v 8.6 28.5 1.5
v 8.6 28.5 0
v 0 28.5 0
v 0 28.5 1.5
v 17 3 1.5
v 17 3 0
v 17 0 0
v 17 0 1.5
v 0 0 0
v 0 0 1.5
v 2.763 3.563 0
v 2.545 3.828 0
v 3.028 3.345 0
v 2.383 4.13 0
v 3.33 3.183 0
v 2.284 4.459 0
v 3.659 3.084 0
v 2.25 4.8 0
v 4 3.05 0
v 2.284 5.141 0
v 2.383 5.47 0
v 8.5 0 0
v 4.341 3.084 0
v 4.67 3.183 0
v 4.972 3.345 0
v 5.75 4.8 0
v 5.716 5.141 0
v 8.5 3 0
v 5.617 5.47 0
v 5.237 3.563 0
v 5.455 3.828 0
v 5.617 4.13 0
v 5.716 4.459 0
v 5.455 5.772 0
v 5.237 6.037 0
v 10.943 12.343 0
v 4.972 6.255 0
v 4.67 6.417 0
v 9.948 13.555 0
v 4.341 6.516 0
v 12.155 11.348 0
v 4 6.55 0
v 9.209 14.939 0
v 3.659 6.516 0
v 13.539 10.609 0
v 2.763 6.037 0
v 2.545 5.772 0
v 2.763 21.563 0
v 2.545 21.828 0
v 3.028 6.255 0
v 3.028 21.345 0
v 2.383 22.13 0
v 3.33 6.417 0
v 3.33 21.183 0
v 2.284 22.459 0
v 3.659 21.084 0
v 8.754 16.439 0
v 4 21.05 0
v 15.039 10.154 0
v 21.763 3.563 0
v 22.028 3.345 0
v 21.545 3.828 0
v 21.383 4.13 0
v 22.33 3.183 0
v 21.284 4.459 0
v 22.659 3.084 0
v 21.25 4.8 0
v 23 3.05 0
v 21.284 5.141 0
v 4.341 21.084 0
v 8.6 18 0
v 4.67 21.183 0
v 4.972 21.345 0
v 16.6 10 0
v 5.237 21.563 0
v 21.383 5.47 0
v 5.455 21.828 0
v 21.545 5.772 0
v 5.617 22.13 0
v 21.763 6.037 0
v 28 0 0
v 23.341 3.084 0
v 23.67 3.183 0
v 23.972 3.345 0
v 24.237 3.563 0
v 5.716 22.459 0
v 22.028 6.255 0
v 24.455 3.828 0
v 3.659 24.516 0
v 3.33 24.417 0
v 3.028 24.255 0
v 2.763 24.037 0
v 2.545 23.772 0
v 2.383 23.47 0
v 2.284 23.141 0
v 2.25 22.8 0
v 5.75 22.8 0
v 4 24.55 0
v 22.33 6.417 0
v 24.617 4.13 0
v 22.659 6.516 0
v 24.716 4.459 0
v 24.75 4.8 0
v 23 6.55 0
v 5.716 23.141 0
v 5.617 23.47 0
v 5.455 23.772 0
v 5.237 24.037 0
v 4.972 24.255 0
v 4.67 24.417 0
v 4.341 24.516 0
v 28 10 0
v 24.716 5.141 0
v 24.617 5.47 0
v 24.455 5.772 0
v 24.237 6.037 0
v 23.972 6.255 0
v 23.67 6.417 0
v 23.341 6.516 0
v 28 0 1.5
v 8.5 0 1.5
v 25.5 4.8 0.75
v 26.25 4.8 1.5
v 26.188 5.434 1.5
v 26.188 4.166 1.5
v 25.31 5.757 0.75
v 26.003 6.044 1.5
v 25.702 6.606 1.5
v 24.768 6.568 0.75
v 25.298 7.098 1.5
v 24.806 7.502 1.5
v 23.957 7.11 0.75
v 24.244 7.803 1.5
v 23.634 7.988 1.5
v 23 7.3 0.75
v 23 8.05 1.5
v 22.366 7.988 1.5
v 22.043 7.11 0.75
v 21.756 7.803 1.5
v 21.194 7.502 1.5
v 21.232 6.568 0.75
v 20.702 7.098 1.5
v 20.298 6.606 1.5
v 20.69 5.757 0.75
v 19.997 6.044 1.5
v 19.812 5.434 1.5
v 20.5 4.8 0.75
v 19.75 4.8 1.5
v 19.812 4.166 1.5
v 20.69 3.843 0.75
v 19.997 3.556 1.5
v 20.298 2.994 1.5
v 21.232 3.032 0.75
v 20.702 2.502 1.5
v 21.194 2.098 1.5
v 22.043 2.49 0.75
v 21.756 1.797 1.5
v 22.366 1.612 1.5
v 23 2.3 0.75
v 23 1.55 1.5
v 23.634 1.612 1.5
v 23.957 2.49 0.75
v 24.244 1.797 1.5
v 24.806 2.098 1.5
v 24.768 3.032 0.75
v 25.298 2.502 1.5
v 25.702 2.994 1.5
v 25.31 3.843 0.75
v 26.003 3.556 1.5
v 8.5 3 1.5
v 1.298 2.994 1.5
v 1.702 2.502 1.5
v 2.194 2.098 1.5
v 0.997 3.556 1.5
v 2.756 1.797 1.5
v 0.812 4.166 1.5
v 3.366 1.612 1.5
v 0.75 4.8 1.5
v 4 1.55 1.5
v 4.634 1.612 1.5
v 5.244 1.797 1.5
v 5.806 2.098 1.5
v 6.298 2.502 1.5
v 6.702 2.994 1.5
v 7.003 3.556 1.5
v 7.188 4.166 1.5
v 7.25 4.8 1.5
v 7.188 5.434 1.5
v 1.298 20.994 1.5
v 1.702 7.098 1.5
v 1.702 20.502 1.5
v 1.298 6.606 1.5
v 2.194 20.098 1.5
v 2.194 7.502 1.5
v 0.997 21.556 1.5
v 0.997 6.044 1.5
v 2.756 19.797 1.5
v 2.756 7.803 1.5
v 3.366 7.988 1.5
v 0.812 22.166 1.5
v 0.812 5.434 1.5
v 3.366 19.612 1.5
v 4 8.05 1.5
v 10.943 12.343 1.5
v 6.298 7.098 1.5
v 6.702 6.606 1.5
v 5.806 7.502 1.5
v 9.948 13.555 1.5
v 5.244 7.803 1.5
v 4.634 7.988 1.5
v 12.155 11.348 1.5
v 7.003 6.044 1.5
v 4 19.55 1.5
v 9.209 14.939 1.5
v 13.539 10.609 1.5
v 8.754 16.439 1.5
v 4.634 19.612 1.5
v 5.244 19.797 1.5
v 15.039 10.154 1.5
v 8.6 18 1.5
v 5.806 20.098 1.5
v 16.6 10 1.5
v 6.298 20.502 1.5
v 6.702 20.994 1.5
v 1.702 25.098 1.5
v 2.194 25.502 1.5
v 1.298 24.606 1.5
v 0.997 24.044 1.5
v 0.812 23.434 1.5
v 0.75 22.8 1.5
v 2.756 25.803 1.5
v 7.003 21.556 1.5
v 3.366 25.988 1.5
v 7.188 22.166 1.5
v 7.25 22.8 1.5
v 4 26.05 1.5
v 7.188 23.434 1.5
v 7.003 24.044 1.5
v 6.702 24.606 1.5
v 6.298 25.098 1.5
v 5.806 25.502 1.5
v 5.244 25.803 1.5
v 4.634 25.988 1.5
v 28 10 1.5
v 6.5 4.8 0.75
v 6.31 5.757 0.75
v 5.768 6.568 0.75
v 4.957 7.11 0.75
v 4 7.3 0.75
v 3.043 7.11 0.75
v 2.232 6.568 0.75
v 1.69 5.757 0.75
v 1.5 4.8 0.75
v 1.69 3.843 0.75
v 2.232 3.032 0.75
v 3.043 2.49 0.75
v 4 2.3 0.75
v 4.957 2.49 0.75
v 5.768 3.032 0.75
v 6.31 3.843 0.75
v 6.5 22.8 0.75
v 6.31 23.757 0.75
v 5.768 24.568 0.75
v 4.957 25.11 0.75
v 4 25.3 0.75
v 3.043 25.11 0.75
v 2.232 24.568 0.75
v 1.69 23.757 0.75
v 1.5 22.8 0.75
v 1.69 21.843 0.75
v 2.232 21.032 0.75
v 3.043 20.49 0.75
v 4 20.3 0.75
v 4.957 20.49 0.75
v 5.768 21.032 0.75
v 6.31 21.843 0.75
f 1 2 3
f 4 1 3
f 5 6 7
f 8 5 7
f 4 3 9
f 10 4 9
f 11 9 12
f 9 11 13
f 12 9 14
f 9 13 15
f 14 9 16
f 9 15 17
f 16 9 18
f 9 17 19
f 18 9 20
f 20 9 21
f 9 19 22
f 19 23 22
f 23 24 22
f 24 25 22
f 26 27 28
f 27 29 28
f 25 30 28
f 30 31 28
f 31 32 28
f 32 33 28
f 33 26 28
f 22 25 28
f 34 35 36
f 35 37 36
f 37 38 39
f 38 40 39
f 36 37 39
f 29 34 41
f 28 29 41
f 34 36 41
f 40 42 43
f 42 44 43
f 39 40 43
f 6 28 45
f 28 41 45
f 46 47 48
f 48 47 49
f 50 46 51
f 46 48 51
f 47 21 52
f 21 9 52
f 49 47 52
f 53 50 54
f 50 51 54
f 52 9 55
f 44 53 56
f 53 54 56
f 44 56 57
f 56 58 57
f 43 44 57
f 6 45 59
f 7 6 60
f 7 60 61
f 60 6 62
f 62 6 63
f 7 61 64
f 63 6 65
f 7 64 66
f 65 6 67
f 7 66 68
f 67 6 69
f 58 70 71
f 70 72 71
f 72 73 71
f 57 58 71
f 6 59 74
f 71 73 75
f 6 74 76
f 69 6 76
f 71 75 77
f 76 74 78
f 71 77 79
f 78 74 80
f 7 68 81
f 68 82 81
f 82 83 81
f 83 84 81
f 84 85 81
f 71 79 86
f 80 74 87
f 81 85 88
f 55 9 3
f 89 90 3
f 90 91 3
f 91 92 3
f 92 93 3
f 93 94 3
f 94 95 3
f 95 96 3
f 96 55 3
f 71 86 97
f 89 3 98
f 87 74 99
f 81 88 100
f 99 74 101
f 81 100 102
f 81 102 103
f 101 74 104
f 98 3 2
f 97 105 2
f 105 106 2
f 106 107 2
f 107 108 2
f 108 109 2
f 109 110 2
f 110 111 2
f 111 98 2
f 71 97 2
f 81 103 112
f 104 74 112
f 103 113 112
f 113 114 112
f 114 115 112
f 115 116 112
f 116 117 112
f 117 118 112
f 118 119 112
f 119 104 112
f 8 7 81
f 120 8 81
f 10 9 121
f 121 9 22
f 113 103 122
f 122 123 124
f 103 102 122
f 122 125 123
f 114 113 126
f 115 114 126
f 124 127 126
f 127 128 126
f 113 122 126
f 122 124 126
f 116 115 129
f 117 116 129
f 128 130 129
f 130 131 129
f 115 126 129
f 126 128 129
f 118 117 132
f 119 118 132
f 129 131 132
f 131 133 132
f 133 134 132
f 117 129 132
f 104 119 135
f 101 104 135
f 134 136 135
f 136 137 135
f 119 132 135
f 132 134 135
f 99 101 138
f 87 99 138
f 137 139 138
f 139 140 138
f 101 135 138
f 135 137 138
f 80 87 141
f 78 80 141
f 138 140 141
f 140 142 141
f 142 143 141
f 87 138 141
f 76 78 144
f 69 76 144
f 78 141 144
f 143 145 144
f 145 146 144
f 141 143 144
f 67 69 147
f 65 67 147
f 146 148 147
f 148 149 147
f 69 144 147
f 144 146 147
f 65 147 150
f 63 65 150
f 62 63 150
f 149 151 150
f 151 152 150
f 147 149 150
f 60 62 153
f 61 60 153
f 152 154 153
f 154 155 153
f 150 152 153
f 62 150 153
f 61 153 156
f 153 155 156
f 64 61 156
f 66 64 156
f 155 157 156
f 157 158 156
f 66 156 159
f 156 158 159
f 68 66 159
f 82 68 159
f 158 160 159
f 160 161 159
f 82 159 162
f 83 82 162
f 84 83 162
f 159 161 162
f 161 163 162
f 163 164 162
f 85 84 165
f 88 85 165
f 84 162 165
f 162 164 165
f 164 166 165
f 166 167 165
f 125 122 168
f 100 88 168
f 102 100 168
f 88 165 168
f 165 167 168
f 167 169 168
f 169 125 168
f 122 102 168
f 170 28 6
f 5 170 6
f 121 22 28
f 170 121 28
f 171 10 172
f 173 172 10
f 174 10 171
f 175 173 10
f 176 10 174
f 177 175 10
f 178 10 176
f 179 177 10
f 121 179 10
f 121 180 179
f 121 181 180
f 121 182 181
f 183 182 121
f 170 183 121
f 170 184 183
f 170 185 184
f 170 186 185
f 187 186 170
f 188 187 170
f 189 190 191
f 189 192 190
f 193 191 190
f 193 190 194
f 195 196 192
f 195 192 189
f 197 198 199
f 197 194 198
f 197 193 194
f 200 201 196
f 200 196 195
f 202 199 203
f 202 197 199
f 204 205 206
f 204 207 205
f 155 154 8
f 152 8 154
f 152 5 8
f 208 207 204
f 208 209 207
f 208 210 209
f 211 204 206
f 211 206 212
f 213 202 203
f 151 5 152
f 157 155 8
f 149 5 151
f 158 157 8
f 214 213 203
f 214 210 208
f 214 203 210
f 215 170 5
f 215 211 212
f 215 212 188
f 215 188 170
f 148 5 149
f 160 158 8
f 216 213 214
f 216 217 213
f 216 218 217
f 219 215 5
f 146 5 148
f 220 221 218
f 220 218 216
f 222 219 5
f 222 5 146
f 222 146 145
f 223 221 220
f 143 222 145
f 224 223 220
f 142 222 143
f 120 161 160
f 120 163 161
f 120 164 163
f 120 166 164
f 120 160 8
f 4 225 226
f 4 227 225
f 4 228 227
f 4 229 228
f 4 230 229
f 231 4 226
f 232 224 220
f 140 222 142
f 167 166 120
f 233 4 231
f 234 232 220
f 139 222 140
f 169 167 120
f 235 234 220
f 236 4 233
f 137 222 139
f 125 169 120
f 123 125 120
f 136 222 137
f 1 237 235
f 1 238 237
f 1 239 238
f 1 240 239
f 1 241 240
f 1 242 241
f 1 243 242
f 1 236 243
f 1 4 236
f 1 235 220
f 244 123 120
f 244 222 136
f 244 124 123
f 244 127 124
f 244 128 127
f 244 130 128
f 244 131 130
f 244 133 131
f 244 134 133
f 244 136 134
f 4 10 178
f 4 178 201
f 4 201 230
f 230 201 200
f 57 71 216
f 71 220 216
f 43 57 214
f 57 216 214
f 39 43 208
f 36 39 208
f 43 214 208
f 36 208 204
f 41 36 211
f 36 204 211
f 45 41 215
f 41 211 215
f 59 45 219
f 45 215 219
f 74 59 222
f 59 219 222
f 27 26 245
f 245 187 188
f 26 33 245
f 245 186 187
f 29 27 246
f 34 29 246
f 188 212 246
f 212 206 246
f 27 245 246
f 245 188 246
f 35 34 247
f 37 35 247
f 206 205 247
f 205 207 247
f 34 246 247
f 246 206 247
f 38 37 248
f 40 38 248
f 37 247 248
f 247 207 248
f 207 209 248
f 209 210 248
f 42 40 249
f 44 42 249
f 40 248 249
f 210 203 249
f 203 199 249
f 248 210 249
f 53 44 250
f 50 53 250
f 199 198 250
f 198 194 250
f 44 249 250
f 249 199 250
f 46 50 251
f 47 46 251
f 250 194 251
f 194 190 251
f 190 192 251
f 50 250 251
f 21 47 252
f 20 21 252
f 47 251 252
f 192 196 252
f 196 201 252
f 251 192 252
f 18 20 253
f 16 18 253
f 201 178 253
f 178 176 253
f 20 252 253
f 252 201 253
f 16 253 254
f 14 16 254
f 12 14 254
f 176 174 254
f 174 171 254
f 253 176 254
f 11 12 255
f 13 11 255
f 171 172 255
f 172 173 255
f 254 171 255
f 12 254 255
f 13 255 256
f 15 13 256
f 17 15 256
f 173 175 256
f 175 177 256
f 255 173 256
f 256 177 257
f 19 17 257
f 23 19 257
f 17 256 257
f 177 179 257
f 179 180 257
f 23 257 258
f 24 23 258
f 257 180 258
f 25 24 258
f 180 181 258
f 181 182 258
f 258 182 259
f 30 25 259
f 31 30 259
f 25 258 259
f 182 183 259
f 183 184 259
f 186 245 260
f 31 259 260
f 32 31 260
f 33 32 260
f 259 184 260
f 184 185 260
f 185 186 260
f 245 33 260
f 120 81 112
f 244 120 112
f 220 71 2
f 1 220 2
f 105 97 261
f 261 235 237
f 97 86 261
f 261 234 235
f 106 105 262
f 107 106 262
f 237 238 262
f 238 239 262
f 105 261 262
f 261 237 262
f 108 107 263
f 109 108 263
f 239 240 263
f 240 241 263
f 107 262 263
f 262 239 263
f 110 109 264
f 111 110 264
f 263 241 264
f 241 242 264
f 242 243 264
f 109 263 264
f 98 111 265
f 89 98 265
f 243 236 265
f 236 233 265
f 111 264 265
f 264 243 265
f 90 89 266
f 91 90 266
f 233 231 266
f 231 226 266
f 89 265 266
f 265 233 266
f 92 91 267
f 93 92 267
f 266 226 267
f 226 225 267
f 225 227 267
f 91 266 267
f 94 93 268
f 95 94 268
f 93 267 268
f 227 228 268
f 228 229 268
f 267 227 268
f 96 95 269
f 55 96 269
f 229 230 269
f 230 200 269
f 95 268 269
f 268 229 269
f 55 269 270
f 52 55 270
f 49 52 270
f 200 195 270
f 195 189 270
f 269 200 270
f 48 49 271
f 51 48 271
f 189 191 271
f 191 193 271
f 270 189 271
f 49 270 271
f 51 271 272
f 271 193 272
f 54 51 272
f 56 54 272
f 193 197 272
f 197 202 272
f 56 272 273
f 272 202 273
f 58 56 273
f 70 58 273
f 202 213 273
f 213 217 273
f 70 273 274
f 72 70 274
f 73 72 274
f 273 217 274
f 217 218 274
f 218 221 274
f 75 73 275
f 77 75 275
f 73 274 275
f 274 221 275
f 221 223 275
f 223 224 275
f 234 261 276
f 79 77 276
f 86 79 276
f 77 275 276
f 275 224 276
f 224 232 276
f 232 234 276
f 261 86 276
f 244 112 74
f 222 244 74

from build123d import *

# Parameters (mm, degrees)
F0_R     = 1.75
F1_DEPTH = 1.5
F2_SIZE  = 1.49999
F3_R     = 8


# Not quite as in the source:
# - a fillet or chamfer is up to 0.001 mm smaller than in the source, because OpenCascade refuses the exact size


with BuildPart() as f1:
    # F0 (on Top) → F1 (new body)
    with BuildSketch(Plane.XY):
        Polygon((0, 28.5), (0, 0), (8.5, 0), (8.5, 3), (17, 3), (17, 0), (28, 0), (28, 10), (8.6, 10), (8.6, 28.5), align=None)
        with Locations((4, 4.8)):
            Circle(F0_R, mode=Mode.SUBTRACT)
        with Locations((23, 4.8)):
            Circle(F0_R, mode=Mode.SUBTRACT)
        with Locations((4, 22.8)):
            Circle(F0_R, mode=Mode.SUBTRACT)
    extrude(amount=F1_DEPTH)

    # F2 (size 1.5 in the source; OpenCascade refuses exactly that, so slightly less here)
    f2_edges = [f1.edges().sort_by_distance(p)[0] for p in [
        (2.25, 22.8, 1.5),
        (2.25, 4.8, 1.5),
        (21.25, 4.8, 1.5),
    ]]
    chamfer(f2_edges, length=F2_SIZE)

    # F3
    f3_edges = [f1.edges().sort_by_distance(p)[0] for p in [
        (8.6, 10, 0.75),
    ]]
    fillet(f3_edges, radius=F3_R)


solid = f1.part
